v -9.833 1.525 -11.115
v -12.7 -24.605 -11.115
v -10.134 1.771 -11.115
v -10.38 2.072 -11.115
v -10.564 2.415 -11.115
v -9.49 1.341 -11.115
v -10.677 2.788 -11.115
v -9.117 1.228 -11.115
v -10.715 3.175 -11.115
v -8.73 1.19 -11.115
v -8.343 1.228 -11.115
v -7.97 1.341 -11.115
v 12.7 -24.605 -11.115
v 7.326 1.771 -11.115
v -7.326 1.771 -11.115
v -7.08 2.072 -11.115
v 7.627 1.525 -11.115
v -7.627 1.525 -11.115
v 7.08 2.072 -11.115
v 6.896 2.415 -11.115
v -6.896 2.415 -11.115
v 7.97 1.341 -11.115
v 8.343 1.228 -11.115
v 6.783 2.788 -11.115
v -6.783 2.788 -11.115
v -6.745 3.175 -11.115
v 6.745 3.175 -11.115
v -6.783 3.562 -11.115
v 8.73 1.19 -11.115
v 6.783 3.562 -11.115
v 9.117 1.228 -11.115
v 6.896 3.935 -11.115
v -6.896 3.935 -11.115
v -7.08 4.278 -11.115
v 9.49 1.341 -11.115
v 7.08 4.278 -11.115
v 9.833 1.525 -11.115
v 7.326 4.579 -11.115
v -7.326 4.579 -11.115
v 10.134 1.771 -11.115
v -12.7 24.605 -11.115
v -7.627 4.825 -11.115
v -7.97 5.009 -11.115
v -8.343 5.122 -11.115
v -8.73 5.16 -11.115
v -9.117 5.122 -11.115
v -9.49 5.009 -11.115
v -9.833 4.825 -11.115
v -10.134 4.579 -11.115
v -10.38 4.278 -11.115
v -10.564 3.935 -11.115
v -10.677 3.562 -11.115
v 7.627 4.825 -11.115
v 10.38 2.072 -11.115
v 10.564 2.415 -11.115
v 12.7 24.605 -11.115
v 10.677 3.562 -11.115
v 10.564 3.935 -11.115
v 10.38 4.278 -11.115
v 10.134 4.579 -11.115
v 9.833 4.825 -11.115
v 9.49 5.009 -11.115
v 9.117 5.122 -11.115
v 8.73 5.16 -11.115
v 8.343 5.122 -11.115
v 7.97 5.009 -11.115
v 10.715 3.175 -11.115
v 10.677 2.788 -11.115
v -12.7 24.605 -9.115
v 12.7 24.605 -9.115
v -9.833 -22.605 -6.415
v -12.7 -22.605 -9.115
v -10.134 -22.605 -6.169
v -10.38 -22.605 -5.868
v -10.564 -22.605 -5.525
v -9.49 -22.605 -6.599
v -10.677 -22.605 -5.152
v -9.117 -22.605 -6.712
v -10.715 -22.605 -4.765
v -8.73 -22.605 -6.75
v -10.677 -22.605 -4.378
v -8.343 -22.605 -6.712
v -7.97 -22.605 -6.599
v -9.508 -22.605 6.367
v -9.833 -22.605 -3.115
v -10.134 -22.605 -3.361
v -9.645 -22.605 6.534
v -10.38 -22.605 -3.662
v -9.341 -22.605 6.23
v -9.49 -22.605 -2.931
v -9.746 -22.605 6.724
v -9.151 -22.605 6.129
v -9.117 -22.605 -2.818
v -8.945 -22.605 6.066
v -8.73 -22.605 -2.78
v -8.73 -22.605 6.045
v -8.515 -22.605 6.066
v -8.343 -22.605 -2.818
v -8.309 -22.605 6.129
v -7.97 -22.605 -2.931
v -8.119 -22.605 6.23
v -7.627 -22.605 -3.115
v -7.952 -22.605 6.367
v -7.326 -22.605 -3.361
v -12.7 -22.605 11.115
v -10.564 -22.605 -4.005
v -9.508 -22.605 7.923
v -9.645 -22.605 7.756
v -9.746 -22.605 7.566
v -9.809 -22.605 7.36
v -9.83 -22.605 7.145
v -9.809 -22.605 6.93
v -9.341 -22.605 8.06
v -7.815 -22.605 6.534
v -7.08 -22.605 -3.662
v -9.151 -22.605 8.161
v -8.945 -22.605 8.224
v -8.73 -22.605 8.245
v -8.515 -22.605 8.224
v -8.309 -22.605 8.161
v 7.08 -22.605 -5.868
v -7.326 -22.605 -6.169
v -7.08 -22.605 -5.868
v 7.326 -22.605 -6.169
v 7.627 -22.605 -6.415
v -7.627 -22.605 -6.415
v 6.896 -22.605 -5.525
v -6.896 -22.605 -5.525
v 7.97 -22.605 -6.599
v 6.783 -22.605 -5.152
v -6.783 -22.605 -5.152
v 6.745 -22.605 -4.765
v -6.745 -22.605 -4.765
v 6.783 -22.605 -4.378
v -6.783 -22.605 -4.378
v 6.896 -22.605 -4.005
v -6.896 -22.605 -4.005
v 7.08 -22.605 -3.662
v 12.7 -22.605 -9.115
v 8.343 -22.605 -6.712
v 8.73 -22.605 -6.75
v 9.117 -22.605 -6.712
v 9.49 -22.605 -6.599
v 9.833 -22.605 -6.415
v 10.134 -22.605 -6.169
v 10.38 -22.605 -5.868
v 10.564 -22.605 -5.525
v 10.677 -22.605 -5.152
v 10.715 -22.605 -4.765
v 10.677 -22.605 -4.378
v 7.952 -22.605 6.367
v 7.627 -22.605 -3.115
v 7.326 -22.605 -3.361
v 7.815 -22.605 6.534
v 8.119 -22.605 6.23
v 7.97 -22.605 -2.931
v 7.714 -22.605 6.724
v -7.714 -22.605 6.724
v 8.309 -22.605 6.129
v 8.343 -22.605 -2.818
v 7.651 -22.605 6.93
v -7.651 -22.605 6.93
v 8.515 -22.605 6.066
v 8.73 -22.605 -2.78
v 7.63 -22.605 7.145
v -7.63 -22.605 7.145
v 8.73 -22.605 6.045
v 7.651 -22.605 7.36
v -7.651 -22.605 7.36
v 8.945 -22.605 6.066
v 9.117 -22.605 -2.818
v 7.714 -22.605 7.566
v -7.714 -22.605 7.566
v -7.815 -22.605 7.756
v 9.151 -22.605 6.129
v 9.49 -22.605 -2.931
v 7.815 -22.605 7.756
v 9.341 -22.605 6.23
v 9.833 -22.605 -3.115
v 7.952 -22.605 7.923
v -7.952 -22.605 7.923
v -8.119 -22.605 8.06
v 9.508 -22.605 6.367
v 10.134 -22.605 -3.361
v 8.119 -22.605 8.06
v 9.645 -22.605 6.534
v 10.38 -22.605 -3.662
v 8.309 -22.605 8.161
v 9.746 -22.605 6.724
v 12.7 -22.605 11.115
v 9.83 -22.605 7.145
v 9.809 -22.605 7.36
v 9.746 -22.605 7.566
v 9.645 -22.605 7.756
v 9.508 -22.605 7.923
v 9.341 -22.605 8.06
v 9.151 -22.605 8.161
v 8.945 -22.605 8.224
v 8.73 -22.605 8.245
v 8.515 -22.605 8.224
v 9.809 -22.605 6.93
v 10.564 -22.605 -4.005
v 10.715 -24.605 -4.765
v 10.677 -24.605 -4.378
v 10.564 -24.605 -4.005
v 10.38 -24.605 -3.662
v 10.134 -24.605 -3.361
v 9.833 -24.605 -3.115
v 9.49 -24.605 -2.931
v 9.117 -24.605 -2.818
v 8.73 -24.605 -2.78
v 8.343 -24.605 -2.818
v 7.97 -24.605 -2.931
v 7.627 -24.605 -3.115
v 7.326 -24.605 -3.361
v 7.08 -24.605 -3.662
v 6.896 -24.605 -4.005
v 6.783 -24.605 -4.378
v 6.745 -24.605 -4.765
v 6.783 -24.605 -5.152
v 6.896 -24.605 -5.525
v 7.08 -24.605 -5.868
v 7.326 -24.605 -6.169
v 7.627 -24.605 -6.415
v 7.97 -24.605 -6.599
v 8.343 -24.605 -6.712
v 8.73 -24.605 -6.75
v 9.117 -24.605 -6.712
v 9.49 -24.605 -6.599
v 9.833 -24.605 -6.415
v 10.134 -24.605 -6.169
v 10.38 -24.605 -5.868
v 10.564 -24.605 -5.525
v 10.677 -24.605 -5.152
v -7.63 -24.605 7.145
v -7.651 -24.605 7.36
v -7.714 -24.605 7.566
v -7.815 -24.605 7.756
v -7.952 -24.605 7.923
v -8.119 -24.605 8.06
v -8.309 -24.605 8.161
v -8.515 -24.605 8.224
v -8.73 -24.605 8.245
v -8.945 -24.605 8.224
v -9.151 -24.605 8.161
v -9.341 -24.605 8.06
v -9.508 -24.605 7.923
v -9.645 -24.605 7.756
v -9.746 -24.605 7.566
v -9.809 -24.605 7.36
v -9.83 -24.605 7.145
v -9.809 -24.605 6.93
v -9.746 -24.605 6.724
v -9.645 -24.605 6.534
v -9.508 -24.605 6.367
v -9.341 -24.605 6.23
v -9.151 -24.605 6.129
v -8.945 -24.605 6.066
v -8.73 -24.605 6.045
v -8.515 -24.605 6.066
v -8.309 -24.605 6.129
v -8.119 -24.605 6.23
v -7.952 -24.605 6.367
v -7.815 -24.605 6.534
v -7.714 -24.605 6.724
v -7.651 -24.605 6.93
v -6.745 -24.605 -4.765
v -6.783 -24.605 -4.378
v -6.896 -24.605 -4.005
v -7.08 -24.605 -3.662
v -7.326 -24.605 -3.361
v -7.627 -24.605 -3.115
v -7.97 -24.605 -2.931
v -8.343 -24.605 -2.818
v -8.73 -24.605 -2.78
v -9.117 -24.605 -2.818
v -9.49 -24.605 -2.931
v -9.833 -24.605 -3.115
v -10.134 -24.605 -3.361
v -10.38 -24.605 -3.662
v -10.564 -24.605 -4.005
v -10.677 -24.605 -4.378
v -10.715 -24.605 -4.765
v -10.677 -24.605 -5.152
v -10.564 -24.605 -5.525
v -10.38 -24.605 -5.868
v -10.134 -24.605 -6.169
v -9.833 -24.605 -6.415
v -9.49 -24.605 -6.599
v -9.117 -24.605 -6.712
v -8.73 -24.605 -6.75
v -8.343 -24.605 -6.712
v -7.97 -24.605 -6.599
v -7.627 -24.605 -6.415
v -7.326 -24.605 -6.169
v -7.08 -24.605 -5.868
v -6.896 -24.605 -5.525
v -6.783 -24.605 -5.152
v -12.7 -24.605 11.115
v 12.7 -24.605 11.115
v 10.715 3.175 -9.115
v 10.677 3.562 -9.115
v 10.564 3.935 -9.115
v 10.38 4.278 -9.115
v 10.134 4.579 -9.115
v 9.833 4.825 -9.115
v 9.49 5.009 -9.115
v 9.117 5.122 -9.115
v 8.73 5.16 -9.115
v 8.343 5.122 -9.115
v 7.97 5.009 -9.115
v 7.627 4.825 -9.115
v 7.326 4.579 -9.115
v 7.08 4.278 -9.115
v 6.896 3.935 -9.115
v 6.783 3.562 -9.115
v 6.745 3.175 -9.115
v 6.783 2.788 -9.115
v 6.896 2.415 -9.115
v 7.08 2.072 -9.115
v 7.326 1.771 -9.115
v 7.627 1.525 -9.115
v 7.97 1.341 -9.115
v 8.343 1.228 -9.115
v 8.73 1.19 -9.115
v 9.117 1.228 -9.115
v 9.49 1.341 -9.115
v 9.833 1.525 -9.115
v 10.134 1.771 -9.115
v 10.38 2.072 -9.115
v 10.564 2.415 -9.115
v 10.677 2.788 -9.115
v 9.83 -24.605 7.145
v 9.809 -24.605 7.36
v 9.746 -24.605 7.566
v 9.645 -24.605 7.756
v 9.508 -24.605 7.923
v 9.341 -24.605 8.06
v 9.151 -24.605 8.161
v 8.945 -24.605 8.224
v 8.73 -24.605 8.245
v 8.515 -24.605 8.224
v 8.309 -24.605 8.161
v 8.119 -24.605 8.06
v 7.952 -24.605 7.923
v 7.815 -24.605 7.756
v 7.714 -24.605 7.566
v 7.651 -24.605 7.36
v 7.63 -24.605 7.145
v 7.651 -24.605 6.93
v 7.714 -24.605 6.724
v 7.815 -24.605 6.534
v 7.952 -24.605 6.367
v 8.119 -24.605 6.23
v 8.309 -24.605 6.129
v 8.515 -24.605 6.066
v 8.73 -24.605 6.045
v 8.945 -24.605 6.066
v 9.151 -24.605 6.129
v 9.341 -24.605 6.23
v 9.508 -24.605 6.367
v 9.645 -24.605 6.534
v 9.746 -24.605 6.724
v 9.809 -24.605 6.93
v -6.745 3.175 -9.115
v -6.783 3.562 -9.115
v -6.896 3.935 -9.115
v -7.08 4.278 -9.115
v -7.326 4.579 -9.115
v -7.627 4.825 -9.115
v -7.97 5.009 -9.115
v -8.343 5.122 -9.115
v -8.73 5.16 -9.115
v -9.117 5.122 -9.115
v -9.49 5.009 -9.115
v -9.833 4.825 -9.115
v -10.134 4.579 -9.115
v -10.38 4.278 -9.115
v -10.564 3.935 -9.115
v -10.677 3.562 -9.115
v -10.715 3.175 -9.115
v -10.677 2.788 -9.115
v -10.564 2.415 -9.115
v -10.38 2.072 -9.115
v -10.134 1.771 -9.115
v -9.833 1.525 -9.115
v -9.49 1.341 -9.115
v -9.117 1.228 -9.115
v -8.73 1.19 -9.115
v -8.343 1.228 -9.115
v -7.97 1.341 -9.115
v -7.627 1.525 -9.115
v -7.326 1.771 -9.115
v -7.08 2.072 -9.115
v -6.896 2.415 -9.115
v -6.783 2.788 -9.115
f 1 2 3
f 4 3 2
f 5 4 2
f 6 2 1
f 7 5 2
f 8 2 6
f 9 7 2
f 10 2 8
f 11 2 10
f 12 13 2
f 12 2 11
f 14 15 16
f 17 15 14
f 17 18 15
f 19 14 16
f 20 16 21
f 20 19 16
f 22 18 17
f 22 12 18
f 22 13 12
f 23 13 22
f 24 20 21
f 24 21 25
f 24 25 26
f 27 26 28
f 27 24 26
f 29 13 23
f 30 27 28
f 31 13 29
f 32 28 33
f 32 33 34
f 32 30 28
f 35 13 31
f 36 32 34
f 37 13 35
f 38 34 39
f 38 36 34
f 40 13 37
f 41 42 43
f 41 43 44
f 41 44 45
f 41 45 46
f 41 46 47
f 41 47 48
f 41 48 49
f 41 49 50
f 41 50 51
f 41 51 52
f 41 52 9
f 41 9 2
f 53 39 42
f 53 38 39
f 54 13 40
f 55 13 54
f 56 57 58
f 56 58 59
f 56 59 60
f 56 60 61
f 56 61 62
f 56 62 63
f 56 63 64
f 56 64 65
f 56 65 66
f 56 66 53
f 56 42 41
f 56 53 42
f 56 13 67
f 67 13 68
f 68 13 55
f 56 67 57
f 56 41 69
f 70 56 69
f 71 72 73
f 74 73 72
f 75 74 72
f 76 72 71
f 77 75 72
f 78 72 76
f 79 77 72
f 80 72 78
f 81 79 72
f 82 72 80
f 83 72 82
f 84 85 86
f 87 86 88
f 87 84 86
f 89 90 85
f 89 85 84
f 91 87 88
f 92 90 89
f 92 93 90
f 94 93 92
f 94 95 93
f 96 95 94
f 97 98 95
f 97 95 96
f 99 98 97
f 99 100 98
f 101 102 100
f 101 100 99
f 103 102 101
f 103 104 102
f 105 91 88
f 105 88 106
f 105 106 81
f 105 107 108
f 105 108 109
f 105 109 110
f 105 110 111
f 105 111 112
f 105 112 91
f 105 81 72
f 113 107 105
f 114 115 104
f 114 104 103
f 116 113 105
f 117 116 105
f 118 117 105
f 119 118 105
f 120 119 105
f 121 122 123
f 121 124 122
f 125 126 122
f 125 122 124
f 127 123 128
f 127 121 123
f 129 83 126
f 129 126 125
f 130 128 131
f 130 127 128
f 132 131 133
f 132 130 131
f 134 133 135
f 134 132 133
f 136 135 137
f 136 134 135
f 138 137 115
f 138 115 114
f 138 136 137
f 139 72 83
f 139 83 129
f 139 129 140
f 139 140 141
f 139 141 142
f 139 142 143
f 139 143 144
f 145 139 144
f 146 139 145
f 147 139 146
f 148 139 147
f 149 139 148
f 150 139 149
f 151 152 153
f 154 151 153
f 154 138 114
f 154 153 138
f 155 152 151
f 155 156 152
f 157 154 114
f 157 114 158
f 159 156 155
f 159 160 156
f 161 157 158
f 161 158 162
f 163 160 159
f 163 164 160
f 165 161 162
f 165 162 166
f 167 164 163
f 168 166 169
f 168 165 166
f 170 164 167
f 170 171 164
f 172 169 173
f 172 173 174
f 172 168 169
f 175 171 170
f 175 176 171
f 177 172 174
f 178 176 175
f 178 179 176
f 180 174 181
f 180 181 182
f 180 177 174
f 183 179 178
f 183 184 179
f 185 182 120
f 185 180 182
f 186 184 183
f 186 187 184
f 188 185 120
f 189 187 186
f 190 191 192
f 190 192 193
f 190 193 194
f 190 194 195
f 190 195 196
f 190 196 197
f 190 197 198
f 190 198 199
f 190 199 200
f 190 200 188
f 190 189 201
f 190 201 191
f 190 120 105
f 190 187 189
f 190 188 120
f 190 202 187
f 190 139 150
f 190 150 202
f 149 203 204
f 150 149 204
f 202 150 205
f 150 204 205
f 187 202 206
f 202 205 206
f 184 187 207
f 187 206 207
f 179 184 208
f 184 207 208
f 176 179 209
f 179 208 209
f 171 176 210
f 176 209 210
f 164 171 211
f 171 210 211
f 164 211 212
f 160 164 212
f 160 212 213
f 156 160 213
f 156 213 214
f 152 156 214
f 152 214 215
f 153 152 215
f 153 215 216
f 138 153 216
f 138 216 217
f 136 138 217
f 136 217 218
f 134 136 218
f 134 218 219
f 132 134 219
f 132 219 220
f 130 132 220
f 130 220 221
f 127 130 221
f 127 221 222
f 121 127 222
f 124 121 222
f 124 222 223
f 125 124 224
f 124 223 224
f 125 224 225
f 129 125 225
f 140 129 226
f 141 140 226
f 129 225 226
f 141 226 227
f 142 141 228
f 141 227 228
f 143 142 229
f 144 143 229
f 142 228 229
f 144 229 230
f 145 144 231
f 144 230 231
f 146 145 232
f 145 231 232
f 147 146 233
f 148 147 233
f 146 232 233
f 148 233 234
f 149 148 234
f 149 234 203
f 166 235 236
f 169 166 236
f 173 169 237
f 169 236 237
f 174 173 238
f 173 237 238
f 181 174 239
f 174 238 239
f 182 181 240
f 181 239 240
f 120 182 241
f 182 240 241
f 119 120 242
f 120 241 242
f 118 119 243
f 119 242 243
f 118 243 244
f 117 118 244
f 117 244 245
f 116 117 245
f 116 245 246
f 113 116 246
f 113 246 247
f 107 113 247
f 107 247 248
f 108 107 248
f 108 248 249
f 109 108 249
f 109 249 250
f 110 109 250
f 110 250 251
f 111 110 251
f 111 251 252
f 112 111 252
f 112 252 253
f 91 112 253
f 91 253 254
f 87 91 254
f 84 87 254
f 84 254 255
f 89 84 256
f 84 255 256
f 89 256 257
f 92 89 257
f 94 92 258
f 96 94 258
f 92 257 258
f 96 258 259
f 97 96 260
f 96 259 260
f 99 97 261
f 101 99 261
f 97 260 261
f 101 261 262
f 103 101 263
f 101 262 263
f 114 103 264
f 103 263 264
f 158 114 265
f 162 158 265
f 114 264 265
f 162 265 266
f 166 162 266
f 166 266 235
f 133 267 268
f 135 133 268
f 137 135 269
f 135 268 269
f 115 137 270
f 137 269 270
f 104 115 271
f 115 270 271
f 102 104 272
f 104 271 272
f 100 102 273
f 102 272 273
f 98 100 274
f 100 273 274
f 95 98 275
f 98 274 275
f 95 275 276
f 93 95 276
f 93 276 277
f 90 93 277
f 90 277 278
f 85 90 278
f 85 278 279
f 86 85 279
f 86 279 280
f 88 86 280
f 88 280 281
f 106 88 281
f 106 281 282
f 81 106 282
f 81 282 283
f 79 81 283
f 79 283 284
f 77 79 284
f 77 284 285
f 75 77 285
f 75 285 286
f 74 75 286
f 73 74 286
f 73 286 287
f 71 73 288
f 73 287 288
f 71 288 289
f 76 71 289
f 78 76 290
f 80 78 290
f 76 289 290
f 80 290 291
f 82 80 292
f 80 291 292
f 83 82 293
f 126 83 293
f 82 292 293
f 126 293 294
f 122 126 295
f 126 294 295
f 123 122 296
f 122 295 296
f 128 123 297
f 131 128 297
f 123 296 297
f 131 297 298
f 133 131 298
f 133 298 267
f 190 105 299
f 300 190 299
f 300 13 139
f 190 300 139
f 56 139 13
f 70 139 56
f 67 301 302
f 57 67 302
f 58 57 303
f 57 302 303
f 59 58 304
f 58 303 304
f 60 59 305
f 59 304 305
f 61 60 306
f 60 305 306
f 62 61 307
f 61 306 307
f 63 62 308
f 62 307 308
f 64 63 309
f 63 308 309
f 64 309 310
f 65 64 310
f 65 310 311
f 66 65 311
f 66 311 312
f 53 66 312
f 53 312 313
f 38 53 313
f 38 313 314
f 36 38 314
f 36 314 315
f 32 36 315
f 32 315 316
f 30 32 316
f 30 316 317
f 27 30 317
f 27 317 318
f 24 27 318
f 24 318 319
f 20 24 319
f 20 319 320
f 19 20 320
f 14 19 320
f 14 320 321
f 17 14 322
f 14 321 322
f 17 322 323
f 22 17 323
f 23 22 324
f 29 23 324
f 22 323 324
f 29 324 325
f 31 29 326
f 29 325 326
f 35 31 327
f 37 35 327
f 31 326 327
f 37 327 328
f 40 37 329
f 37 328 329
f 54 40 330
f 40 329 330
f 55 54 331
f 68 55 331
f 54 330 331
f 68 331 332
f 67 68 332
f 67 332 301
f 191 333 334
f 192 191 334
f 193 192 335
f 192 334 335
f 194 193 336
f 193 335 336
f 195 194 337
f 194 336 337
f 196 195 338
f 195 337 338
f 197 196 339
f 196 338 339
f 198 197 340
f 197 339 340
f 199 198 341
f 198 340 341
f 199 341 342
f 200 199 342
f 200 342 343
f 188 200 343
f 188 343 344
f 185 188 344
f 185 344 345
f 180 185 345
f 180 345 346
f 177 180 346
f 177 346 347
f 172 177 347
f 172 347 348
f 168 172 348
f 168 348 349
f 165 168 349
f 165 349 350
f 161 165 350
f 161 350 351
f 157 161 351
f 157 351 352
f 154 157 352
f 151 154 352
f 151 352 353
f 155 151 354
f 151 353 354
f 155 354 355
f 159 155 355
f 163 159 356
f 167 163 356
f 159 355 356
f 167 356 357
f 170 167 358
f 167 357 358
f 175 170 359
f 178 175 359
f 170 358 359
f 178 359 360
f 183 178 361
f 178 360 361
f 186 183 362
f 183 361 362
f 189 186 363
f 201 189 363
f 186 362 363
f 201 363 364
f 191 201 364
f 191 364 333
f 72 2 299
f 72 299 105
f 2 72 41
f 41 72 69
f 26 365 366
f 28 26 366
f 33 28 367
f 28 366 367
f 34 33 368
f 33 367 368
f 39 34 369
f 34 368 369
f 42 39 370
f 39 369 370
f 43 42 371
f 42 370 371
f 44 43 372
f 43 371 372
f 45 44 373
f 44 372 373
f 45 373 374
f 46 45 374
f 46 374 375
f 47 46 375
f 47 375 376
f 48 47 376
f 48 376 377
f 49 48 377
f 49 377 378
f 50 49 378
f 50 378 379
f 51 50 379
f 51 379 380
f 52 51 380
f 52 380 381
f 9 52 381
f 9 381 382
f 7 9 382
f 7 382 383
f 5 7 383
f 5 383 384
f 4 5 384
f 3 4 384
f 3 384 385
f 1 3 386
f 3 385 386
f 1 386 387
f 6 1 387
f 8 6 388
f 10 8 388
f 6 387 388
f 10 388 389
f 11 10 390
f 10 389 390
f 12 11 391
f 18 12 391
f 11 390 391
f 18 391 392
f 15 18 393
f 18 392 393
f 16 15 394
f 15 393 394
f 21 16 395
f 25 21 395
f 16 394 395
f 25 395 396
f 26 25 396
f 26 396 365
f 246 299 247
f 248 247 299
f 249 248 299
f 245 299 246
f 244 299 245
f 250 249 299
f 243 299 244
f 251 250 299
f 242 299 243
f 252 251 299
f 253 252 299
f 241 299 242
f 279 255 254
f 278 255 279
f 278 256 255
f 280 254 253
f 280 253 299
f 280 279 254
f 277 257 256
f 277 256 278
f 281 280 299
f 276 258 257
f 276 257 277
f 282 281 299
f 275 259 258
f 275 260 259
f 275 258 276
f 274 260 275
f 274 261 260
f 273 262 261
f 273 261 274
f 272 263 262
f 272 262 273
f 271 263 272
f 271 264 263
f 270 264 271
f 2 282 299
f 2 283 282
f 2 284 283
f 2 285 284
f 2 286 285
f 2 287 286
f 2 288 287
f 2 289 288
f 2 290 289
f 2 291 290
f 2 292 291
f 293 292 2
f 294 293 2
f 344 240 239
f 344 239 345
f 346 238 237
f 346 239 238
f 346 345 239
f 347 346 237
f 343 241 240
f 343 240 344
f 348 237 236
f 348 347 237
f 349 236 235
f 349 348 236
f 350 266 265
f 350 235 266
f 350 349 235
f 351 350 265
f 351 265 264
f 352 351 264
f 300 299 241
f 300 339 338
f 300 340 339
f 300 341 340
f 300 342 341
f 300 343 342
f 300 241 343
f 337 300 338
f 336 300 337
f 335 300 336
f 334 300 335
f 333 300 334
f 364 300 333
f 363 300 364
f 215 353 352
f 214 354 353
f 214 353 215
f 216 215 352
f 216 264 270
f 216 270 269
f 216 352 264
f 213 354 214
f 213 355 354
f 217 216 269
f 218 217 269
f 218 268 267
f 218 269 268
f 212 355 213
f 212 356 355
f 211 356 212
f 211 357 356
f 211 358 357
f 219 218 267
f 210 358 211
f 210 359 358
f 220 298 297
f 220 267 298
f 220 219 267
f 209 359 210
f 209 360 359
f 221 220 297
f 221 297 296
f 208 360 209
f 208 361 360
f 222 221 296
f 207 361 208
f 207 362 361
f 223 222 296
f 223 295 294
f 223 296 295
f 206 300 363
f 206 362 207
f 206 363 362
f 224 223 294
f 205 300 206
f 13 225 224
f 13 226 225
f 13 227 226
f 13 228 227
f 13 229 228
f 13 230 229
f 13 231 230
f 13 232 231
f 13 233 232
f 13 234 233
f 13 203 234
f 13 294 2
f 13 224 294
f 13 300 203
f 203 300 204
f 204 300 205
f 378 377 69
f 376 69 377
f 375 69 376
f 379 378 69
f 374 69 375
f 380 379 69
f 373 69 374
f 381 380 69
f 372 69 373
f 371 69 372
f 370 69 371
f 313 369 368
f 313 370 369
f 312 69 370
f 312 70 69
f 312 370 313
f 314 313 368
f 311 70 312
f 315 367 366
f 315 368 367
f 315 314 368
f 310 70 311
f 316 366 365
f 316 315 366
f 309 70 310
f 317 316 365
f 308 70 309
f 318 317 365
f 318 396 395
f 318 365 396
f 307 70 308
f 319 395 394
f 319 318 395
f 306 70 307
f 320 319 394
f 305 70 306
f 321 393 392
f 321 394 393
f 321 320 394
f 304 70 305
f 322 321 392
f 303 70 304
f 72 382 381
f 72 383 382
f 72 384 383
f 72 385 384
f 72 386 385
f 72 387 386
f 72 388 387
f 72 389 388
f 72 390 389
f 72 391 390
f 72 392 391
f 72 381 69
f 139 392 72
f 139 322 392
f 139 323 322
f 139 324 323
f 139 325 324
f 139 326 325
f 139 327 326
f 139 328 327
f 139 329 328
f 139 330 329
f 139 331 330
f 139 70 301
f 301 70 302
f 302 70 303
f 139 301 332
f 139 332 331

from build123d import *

# Parameters (mm, degrees)
F1_DEPTH = 12.7
F3_R     = 1.985
F3_R_2   = 1.1
F4_DEPTH = 49.211
F2_R     = 1.985
F5_DEPTH = 2.001


with BuildPart() as f1:
    # F0 (on Right) → F1 (new body, symmetric)
    with BuildSketch(Plane.YZ):
        Polygon((-22.605, -9.115), (-22.605, 11.115), (-24.605, 11.115), (-24.605, -11.115), (24.605, -11.115), (24.605, -9.115), align=None)
    extrude(amount=F1_DEPTH, both=True)

    # F3 (on face) → F4 (cut, through all)
    with BuildSketch(Plane.XZ.offset(24.605)):
        with Locations((8.73, -4.765)):
            Circle(F3_R)
        with Locations((8.73, 7.145)):
            Circle(F3_R_2)
        with Locations((-8.73, -4.765)):
            Circle(F3_R)
        with Locations((-8.73, 7.145)):
            Circle(F3_R_2)
    extrude(amount=-F4_DEPTH, mode=Mode.SUBTRACT)

    # F2 (on face) → F5 (cut, through all)
    with BuildSketch(Plane.XY.offset(-9.115)):
        with Locations((-8.73, 3.175)):
            Circle(F2_R)
        with Locations((8.73, 3.175)):
            Circle(F2_R)
    extrude(amount=-F5_DEPTH, mode=Mode.SUBTRACT)


solid = f1.part
